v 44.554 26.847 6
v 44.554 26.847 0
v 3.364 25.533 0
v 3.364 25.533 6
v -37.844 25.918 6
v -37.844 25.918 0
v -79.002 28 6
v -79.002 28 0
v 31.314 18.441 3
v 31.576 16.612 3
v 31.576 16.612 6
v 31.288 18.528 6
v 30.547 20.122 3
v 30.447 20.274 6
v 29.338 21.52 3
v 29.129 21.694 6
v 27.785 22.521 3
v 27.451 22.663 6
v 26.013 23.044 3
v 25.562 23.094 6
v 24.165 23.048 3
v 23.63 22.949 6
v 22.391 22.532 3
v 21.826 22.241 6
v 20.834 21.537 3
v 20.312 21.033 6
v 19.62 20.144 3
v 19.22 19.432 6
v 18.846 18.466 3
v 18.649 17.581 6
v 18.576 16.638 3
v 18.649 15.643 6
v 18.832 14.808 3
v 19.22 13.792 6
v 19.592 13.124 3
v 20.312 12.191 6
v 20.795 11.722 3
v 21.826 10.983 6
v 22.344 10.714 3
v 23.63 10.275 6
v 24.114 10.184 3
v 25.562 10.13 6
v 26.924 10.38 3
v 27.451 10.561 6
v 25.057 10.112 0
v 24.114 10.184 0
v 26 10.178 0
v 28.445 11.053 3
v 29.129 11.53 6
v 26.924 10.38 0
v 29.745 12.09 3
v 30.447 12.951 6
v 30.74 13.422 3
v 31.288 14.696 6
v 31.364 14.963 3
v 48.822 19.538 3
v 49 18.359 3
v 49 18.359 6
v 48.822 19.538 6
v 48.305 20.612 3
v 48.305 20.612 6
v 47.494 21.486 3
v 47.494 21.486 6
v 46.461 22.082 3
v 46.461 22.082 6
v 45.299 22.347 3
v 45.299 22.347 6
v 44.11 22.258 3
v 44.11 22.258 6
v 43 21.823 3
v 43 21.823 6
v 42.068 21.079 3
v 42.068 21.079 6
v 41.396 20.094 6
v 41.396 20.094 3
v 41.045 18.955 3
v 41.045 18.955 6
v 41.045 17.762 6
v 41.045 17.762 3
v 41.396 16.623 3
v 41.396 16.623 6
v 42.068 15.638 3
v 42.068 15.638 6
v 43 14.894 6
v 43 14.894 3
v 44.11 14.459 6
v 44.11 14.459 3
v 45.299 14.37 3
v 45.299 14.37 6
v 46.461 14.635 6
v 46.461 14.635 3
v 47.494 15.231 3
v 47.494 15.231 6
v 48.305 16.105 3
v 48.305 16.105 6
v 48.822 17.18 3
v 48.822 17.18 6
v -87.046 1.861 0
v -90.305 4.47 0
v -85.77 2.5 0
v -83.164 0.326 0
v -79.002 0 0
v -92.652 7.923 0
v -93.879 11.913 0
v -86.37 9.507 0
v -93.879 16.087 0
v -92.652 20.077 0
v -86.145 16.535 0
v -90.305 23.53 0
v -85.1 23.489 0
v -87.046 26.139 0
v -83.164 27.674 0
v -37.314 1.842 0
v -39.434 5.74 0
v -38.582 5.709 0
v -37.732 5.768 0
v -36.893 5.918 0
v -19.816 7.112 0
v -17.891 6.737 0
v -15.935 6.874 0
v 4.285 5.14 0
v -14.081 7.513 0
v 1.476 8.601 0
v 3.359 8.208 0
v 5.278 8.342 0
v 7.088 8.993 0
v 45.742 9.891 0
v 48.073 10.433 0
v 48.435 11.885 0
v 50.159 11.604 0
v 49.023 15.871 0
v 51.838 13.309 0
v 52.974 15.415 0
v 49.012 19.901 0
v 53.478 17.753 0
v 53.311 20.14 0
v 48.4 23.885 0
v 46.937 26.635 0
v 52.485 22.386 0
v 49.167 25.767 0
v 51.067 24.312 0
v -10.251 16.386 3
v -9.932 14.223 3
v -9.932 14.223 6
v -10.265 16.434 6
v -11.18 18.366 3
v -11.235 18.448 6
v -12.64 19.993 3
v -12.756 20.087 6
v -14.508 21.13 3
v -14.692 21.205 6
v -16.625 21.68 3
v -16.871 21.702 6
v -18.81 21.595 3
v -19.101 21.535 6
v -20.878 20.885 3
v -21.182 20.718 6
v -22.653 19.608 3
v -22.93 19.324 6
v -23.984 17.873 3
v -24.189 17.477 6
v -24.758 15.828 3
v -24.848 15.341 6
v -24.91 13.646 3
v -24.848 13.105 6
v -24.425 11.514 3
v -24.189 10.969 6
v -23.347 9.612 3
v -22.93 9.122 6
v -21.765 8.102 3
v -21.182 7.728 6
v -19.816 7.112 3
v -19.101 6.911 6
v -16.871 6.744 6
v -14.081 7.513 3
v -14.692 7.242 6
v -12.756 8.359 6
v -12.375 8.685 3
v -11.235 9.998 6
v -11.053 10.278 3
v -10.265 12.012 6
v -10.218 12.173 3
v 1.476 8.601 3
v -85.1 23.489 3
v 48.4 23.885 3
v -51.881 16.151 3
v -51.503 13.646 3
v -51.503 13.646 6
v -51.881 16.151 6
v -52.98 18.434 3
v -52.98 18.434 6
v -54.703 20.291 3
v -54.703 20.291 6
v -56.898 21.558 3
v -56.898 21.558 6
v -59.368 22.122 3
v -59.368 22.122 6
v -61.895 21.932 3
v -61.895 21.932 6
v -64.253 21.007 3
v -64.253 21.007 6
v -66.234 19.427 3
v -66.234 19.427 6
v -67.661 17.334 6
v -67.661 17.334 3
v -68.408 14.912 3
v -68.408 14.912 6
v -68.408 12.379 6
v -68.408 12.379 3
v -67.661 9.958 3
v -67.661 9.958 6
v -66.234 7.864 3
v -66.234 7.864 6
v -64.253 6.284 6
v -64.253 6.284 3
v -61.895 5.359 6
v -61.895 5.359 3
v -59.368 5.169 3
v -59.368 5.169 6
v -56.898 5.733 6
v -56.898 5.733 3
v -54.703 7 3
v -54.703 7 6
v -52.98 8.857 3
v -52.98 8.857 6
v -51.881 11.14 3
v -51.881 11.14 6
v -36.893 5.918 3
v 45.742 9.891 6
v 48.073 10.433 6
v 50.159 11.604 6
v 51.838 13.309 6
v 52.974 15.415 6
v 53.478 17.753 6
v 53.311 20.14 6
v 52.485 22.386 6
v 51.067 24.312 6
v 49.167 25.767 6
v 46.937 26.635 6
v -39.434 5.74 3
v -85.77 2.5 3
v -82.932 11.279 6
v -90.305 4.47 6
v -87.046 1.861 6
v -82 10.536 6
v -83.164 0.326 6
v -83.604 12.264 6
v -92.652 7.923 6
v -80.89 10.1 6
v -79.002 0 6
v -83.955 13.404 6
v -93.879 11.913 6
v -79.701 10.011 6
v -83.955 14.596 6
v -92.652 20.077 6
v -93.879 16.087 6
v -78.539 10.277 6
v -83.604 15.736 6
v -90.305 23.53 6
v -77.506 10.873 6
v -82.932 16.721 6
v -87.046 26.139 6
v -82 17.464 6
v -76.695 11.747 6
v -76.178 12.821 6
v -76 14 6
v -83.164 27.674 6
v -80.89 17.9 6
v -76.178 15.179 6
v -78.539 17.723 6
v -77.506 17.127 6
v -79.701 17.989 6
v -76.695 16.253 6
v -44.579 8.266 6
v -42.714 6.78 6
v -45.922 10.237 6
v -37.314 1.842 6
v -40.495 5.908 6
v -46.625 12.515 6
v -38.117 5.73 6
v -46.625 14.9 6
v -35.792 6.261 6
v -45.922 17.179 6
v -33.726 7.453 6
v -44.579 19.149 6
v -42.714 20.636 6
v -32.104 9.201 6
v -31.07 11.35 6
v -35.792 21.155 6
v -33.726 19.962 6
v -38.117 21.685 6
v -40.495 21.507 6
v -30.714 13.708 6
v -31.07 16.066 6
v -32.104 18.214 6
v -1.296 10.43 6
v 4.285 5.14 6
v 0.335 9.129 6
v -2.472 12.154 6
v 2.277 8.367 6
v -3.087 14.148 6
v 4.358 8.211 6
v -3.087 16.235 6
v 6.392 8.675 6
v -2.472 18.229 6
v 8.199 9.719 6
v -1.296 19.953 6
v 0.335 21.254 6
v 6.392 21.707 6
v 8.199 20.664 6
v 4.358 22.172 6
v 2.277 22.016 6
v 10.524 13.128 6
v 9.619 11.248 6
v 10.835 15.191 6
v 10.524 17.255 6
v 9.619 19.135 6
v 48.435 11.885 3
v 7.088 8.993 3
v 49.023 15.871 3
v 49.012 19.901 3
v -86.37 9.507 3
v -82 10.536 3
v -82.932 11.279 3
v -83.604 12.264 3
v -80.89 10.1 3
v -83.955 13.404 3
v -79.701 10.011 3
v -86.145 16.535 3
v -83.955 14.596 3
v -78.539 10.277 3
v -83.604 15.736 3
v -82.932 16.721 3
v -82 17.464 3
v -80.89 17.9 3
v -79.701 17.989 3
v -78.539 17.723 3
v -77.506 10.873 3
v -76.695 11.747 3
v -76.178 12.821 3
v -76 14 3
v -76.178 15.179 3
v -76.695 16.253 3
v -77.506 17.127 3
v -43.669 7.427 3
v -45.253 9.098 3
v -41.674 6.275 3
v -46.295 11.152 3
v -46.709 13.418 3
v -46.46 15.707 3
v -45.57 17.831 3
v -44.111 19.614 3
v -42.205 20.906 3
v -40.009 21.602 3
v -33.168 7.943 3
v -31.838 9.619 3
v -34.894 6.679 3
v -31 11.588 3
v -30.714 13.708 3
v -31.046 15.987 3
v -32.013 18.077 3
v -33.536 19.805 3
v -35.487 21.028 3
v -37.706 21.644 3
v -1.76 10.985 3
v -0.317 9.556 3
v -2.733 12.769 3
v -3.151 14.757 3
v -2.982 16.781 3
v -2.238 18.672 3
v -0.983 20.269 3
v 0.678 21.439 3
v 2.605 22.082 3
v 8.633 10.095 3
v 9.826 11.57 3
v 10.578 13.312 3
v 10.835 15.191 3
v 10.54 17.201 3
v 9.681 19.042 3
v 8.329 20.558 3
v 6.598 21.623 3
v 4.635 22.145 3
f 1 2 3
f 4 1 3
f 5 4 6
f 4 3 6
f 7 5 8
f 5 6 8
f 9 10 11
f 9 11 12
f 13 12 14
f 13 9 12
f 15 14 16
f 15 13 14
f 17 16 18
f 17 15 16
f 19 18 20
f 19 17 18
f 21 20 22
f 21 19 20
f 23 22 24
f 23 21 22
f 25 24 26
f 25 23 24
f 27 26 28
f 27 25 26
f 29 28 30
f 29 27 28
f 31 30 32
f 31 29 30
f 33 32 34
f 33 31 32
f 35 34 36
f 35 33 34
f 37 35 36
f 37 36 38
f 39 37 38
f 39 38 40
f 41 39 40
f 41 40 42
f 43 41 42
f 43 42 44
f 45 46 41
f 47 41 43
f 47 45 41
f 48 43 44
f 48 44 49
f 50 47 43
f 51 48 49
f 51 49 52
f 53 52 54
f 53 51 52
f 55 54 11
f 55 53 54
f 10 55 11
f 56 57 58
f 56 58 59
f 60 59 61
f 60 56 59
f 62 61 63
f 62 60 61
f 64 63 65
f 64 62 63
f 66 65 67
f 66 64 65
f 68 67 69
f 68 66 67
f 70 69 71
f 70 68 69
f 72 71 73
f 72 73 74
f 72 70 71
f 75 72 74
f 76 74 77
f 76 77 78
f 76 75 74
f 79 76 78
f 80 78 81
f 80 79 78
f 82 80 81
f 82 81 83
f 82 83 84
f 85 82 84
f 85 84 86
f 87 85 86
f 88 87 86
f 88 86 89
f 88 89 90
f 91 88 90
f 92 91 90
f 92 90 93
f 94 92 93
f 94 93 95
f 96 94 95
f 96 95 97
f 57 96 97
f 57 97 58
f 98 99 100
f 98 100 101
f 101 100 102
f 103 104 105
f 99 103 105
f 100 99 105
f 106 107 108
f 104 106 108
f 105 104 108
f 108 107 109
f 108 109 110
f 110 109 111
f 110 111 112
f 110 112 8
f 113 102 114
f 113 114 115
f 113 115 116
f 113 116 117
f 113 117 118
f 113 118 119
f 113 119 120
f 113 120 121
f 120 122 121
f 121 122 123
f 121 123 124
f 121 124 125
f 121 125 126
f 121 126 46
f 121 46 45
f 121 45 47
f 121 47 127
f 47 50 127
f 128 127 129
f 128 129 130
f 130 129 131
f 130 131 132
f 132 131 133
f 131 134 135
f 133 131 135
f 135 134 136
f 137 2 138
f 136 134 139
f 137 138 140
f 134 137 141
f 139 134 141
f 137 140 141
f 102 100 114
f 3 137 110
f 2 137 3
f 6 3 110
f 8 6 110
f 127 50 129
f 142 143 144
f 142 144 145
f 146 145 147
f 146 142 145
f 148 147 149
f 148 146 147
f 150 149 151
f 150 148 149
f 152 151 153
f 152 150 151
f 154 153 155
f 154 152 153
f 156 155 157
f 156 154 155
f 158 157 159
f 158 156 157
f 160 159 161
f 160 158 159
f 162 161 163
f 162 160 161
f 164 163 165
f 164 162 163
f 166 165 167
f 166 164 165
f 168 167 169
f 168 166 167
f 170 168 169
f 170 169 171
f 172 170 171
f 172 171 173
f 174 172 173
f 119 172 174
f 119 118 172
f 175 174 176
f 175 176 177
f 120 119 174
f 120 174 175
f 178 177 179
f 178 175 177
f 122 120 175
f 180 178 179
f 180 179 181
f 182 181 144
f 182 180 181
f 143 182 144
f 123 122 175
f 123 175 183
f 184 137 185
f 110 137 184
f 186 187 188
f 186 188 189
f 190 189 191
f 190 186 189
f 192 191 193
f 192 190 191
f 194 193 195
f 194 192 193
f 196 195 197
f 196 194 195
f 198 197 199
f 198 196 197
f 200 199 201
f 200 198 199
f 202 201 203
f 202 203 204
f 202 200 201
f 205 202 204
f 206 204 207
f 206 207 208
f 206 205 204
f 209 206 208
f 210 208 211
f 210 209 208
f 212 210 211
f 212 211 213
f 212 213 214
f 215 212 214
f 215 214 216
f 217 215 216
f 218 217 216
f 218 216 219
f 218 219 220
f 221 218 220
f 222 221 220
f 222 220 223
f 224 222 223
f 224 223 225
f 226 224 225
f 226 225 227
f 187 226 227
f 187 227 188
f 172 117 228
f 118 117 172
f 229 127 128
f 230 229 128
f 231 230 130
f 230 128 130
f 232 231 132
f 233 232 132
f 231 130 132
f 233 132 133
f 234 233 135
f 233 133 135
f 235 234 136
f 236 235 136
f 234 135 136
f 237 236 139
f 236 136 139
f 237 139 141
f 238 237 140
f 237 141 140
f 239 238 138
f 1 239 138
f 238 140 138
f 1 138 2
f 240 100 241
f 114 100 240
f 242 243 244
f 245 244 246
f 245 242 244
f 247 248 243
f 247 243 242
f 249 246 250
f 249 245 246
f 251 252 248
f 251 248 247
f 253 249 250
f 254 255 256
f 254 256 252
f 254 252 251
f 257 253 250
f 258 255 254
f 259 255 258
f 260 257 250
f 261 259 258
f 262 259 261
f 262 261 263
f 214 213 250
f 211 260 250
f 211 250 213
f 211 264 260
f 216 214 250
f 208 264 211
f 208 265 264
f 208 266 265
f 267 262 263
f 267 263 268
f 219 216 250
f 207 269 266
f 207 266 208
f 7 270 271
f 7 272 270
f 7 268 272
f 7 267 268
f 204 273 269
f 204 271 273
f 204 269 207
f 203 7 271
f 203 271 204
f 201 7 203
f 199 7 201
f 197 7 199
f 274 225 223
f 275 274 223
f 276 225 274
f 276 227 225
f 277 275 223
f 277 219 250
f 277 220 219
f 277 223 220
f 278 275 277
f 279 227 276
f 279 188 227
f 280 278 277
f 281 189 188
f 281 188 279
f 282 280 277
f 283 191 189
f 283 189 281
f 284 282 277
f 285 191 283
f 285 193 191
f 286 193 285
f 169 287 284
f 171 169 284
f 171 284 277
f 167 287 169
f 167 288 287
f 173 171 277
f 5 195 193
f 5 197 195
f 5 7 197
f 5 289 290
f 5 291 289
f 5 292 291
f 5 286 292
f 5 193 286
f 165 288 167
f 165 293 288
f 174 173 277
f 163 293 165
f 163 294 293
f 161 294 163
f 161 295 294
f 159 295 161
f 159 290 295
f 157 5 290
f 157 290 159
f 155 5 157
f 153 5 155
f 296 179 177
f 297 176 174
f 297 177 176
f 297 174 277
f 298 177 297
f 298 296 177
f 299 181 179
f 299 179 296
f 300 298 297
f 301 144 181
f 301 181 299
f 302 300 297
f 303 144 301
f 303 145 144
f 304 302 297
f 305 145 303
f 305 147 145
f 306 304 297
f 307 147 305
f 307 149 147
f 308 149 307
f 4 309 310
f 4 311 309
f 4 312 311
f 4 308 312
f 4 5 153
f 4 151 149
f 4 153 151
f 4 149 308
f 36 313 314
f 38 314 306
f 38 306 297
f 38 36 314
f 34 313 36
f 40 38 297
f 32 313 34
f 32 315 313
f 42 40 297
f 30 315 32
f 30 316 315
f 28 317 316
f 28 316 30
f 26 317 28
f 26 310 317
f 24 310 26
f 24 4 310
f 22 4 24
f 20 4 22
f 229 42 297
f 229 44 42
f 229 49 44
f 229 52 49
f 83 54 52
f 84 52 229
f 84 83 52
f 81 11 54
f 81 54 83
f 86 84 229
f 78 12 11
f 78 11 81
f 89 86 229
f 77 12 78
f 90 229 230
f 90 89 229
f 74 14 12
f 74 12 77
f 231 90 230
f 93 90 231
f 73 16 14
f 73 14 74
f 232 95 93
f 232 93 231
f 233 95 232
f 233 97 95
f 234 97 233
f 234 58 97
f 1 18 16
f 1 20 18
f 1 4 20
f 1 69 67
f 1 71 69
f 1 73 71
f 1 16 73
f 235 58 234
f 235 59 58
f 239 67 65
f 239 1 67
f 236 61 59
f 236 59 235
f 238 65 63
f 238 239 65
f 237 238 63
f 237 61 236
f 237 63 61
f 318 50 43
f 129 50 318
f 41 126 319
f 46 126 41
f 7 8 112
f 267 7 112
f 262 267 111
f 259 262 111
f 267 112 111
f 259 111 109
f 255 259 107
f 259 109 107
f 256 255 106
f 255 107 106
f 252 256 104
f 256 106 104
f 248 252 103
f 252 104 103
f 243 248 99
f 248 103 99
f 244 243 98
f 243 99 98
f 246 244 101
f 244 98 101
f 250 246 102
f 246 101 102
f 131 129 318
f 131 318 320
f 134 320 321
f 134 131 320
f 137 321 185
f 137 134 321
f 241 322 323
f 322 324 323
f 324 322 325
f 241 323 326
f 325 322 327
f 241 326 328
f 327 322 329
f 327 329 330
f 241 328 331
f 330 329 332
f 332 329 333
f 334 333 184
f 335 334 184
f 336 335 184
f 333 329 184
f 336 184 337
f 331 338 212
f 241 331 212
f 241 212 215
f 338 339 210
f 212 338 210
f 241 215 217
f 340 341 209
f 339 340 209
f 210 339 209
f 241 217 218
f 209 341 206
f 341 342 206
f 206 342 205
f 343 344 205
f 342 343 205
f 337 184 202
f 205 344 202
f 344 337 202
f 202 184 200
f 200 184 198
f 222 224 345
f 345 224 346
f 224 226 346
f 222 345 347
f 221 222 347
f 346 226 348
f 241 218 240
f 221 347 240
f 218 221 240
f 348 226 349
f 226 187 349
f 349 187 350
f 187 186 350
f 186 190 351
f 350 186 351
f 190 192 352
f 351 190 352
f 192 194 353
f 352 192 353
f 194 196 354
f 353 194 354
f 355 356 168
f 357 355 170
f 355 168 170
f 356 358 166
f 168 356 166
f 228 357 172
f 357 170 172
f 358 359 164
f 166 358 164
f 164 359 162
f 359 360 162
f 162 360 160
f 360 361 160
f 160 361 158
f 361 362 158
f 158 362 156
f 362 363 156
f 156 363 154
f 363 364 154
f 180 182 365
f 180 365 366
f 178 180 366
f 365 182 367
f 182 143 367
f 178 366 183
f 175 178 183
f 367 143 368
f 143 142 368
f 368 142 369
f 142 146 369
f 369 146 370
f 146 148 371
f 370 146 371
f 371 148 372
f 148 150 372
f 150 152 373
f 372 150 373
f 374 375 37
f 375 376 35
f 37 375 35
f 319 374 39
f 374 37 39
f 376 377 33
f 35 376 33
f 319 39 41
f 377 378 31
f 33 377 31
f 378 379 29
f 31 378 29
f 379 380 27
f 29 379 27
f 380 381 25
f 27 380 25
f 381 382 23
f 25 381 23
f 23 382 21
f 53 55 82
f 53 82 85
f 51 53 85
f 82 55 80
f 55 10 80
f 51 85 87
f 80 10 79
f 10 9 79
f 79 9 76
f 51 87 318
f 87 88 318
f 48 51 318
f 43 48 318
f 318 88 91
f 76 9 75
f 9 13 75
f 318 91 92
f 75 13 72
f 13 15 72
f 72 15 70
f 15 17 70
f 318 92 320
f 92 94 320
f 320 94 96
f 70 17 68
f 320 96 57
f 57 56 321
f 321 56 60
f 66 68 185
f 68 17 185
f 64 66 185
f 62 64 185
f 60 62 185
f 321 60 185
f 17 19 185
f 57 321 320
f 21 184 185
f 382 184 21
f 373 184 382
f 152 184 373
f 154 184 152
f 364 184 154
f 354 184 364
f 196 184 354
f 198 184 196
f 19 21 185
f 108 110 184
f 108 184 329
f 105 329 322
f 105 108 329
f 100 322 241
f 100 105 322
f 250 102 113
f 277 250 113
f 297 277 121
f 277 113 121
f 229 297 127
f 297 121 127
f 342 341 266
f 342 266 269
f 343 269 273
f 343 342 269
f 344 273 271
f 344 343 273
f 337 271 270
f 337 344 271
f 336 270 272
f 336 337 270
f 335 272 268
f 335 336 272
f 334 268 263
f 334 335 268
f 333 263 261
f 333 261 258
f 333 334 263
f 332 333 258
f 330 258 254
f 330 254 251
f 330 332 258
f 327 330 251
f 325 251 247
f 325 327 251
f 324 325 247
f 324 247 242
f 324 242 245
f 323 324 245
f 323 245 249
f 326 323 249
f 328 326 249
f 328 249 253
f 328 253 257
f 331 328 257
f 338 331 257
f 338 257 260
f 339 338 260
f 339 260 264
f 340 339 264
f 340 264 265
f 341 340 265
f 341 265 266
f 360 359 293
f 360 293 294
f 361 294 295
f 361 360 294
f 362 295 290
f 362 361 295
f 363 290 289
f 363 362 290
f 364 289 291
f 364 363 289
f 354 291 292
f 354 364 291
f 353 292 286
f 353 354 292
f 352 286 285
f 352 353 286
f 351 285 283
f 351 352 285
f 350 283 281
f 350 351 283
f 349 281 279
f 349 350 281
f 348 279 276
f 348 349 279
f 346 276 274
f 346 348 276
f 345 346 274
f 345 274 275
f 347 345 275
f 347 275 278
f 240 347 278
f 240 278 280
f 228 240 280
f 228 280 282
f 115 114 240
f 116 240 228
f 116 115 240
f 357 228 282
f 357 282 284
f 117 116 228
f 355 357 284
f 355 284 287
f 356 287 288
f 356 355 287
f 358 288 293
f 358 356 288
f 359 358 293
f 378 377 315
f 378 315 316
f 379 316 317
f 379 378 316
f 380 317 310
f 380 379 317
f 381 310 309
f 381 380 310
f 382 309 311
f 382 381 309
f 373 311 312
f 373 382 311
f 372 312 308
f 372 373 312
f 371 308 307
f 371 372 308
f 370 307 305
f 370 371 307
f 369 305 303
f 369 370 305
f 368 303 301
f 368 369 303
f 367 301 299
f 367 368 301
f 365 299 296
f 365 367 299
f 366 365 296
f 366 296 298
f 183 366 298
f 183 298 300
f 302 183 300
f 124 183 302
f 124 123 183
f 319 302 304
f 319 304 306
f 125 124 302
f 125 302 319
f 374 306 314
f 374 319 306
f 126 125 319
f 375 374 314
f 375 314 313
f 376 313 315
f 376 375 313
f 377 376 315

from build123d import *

# Parameters (mm, degrees)
F0_R     = 8.5
F0_R_2   = 8
F0_R_3   = 4
F0_R_4   = 7.5
F0_R_5   = 7
F0_R_6   = 6.5
F1_DEPTH = 6
F3_DEPTH = 3


# Not quite as in the source:
# - ends of sketch curves that miss each other by under 0.0002 mm in the source are joined


with BuildPart() as f1:
    # F0 (on Top) → F1 (new body)
    with BuildSketch(Plane.XY):
        with BuildLine():
            ThreePointArc((44.5540603798, 26.8468655378), (-17.2418869333, 25.5132571498), (-79.0021794007, 28))
            ThreePointArc((-79.0021794007, 28), (-94.0355137401, 14), (-79.0021794007, 0))
            ThreePointArc((-79.0021794007, 0), (-16.5001968513, 3.3088101205), (45.7422348275, 9.8910396618))
            ThreePointArc((45.7422348275, 9.8910396618), (53.4792070742, 18.9527489424), (44.5540603798, 26.8468655378))
        make_face()
        with Locations((-60.0031413922, 13.6455344589)):
            Circle(F0_R, mode=Mode.SUBTRACT)
        with Locations((-38.7143914059, 13.7077101978)):
            Circle(F0_R_2, mode=Mode.SUBTRACT)
        with Locations((-80, 14)):
            Circle(F0_R_3, mode=Mode.SUBTRACT)
        with Locations((-17.4317891816, 14.2230589801)):
            Circle(F0_R_4, mode=Mode.SUBTRACT)
        with Locations((3.8350196915, 15.191347242)):
            Circle(F0_R_5, mode=Mode.SUBTRACT)
        with Locations((25.0763967822, 16.6121361411)):
            Circle(F0_R_6, mode=Mode.SUBTRACT)
        with Locations((45, 18.3585710294)):
            Circle(F0_R_3, mode=Mode.SUBTRACT)
    extrude(amount=F1_DEPTH)

    # F2 (on Top) → F3 (cut)
    with BuildSketch(Plane.XY):
        with BuildLine():
            Line((48.3999060802, 23.8845237164), (-85.0995088492, 23.4892851738))
            ThreePointArc((-85.0995088492, 23.4892851738), (-86.3603062967, 13.0242161587), (-85.7702605867, 2.5))
            Line((-85.7702605867, 2.5), (48.4354331402, 11.884576307))
            ThreePointArc((48.4354331402, 11.884576307), (49.0927734894, 17.8865487251), (48.3999060802, 23.8845237164))
        make_face()
    extrude(amount=F3_DEPTH, mode=Mode.SUBTRACT)


solid = f1.part
